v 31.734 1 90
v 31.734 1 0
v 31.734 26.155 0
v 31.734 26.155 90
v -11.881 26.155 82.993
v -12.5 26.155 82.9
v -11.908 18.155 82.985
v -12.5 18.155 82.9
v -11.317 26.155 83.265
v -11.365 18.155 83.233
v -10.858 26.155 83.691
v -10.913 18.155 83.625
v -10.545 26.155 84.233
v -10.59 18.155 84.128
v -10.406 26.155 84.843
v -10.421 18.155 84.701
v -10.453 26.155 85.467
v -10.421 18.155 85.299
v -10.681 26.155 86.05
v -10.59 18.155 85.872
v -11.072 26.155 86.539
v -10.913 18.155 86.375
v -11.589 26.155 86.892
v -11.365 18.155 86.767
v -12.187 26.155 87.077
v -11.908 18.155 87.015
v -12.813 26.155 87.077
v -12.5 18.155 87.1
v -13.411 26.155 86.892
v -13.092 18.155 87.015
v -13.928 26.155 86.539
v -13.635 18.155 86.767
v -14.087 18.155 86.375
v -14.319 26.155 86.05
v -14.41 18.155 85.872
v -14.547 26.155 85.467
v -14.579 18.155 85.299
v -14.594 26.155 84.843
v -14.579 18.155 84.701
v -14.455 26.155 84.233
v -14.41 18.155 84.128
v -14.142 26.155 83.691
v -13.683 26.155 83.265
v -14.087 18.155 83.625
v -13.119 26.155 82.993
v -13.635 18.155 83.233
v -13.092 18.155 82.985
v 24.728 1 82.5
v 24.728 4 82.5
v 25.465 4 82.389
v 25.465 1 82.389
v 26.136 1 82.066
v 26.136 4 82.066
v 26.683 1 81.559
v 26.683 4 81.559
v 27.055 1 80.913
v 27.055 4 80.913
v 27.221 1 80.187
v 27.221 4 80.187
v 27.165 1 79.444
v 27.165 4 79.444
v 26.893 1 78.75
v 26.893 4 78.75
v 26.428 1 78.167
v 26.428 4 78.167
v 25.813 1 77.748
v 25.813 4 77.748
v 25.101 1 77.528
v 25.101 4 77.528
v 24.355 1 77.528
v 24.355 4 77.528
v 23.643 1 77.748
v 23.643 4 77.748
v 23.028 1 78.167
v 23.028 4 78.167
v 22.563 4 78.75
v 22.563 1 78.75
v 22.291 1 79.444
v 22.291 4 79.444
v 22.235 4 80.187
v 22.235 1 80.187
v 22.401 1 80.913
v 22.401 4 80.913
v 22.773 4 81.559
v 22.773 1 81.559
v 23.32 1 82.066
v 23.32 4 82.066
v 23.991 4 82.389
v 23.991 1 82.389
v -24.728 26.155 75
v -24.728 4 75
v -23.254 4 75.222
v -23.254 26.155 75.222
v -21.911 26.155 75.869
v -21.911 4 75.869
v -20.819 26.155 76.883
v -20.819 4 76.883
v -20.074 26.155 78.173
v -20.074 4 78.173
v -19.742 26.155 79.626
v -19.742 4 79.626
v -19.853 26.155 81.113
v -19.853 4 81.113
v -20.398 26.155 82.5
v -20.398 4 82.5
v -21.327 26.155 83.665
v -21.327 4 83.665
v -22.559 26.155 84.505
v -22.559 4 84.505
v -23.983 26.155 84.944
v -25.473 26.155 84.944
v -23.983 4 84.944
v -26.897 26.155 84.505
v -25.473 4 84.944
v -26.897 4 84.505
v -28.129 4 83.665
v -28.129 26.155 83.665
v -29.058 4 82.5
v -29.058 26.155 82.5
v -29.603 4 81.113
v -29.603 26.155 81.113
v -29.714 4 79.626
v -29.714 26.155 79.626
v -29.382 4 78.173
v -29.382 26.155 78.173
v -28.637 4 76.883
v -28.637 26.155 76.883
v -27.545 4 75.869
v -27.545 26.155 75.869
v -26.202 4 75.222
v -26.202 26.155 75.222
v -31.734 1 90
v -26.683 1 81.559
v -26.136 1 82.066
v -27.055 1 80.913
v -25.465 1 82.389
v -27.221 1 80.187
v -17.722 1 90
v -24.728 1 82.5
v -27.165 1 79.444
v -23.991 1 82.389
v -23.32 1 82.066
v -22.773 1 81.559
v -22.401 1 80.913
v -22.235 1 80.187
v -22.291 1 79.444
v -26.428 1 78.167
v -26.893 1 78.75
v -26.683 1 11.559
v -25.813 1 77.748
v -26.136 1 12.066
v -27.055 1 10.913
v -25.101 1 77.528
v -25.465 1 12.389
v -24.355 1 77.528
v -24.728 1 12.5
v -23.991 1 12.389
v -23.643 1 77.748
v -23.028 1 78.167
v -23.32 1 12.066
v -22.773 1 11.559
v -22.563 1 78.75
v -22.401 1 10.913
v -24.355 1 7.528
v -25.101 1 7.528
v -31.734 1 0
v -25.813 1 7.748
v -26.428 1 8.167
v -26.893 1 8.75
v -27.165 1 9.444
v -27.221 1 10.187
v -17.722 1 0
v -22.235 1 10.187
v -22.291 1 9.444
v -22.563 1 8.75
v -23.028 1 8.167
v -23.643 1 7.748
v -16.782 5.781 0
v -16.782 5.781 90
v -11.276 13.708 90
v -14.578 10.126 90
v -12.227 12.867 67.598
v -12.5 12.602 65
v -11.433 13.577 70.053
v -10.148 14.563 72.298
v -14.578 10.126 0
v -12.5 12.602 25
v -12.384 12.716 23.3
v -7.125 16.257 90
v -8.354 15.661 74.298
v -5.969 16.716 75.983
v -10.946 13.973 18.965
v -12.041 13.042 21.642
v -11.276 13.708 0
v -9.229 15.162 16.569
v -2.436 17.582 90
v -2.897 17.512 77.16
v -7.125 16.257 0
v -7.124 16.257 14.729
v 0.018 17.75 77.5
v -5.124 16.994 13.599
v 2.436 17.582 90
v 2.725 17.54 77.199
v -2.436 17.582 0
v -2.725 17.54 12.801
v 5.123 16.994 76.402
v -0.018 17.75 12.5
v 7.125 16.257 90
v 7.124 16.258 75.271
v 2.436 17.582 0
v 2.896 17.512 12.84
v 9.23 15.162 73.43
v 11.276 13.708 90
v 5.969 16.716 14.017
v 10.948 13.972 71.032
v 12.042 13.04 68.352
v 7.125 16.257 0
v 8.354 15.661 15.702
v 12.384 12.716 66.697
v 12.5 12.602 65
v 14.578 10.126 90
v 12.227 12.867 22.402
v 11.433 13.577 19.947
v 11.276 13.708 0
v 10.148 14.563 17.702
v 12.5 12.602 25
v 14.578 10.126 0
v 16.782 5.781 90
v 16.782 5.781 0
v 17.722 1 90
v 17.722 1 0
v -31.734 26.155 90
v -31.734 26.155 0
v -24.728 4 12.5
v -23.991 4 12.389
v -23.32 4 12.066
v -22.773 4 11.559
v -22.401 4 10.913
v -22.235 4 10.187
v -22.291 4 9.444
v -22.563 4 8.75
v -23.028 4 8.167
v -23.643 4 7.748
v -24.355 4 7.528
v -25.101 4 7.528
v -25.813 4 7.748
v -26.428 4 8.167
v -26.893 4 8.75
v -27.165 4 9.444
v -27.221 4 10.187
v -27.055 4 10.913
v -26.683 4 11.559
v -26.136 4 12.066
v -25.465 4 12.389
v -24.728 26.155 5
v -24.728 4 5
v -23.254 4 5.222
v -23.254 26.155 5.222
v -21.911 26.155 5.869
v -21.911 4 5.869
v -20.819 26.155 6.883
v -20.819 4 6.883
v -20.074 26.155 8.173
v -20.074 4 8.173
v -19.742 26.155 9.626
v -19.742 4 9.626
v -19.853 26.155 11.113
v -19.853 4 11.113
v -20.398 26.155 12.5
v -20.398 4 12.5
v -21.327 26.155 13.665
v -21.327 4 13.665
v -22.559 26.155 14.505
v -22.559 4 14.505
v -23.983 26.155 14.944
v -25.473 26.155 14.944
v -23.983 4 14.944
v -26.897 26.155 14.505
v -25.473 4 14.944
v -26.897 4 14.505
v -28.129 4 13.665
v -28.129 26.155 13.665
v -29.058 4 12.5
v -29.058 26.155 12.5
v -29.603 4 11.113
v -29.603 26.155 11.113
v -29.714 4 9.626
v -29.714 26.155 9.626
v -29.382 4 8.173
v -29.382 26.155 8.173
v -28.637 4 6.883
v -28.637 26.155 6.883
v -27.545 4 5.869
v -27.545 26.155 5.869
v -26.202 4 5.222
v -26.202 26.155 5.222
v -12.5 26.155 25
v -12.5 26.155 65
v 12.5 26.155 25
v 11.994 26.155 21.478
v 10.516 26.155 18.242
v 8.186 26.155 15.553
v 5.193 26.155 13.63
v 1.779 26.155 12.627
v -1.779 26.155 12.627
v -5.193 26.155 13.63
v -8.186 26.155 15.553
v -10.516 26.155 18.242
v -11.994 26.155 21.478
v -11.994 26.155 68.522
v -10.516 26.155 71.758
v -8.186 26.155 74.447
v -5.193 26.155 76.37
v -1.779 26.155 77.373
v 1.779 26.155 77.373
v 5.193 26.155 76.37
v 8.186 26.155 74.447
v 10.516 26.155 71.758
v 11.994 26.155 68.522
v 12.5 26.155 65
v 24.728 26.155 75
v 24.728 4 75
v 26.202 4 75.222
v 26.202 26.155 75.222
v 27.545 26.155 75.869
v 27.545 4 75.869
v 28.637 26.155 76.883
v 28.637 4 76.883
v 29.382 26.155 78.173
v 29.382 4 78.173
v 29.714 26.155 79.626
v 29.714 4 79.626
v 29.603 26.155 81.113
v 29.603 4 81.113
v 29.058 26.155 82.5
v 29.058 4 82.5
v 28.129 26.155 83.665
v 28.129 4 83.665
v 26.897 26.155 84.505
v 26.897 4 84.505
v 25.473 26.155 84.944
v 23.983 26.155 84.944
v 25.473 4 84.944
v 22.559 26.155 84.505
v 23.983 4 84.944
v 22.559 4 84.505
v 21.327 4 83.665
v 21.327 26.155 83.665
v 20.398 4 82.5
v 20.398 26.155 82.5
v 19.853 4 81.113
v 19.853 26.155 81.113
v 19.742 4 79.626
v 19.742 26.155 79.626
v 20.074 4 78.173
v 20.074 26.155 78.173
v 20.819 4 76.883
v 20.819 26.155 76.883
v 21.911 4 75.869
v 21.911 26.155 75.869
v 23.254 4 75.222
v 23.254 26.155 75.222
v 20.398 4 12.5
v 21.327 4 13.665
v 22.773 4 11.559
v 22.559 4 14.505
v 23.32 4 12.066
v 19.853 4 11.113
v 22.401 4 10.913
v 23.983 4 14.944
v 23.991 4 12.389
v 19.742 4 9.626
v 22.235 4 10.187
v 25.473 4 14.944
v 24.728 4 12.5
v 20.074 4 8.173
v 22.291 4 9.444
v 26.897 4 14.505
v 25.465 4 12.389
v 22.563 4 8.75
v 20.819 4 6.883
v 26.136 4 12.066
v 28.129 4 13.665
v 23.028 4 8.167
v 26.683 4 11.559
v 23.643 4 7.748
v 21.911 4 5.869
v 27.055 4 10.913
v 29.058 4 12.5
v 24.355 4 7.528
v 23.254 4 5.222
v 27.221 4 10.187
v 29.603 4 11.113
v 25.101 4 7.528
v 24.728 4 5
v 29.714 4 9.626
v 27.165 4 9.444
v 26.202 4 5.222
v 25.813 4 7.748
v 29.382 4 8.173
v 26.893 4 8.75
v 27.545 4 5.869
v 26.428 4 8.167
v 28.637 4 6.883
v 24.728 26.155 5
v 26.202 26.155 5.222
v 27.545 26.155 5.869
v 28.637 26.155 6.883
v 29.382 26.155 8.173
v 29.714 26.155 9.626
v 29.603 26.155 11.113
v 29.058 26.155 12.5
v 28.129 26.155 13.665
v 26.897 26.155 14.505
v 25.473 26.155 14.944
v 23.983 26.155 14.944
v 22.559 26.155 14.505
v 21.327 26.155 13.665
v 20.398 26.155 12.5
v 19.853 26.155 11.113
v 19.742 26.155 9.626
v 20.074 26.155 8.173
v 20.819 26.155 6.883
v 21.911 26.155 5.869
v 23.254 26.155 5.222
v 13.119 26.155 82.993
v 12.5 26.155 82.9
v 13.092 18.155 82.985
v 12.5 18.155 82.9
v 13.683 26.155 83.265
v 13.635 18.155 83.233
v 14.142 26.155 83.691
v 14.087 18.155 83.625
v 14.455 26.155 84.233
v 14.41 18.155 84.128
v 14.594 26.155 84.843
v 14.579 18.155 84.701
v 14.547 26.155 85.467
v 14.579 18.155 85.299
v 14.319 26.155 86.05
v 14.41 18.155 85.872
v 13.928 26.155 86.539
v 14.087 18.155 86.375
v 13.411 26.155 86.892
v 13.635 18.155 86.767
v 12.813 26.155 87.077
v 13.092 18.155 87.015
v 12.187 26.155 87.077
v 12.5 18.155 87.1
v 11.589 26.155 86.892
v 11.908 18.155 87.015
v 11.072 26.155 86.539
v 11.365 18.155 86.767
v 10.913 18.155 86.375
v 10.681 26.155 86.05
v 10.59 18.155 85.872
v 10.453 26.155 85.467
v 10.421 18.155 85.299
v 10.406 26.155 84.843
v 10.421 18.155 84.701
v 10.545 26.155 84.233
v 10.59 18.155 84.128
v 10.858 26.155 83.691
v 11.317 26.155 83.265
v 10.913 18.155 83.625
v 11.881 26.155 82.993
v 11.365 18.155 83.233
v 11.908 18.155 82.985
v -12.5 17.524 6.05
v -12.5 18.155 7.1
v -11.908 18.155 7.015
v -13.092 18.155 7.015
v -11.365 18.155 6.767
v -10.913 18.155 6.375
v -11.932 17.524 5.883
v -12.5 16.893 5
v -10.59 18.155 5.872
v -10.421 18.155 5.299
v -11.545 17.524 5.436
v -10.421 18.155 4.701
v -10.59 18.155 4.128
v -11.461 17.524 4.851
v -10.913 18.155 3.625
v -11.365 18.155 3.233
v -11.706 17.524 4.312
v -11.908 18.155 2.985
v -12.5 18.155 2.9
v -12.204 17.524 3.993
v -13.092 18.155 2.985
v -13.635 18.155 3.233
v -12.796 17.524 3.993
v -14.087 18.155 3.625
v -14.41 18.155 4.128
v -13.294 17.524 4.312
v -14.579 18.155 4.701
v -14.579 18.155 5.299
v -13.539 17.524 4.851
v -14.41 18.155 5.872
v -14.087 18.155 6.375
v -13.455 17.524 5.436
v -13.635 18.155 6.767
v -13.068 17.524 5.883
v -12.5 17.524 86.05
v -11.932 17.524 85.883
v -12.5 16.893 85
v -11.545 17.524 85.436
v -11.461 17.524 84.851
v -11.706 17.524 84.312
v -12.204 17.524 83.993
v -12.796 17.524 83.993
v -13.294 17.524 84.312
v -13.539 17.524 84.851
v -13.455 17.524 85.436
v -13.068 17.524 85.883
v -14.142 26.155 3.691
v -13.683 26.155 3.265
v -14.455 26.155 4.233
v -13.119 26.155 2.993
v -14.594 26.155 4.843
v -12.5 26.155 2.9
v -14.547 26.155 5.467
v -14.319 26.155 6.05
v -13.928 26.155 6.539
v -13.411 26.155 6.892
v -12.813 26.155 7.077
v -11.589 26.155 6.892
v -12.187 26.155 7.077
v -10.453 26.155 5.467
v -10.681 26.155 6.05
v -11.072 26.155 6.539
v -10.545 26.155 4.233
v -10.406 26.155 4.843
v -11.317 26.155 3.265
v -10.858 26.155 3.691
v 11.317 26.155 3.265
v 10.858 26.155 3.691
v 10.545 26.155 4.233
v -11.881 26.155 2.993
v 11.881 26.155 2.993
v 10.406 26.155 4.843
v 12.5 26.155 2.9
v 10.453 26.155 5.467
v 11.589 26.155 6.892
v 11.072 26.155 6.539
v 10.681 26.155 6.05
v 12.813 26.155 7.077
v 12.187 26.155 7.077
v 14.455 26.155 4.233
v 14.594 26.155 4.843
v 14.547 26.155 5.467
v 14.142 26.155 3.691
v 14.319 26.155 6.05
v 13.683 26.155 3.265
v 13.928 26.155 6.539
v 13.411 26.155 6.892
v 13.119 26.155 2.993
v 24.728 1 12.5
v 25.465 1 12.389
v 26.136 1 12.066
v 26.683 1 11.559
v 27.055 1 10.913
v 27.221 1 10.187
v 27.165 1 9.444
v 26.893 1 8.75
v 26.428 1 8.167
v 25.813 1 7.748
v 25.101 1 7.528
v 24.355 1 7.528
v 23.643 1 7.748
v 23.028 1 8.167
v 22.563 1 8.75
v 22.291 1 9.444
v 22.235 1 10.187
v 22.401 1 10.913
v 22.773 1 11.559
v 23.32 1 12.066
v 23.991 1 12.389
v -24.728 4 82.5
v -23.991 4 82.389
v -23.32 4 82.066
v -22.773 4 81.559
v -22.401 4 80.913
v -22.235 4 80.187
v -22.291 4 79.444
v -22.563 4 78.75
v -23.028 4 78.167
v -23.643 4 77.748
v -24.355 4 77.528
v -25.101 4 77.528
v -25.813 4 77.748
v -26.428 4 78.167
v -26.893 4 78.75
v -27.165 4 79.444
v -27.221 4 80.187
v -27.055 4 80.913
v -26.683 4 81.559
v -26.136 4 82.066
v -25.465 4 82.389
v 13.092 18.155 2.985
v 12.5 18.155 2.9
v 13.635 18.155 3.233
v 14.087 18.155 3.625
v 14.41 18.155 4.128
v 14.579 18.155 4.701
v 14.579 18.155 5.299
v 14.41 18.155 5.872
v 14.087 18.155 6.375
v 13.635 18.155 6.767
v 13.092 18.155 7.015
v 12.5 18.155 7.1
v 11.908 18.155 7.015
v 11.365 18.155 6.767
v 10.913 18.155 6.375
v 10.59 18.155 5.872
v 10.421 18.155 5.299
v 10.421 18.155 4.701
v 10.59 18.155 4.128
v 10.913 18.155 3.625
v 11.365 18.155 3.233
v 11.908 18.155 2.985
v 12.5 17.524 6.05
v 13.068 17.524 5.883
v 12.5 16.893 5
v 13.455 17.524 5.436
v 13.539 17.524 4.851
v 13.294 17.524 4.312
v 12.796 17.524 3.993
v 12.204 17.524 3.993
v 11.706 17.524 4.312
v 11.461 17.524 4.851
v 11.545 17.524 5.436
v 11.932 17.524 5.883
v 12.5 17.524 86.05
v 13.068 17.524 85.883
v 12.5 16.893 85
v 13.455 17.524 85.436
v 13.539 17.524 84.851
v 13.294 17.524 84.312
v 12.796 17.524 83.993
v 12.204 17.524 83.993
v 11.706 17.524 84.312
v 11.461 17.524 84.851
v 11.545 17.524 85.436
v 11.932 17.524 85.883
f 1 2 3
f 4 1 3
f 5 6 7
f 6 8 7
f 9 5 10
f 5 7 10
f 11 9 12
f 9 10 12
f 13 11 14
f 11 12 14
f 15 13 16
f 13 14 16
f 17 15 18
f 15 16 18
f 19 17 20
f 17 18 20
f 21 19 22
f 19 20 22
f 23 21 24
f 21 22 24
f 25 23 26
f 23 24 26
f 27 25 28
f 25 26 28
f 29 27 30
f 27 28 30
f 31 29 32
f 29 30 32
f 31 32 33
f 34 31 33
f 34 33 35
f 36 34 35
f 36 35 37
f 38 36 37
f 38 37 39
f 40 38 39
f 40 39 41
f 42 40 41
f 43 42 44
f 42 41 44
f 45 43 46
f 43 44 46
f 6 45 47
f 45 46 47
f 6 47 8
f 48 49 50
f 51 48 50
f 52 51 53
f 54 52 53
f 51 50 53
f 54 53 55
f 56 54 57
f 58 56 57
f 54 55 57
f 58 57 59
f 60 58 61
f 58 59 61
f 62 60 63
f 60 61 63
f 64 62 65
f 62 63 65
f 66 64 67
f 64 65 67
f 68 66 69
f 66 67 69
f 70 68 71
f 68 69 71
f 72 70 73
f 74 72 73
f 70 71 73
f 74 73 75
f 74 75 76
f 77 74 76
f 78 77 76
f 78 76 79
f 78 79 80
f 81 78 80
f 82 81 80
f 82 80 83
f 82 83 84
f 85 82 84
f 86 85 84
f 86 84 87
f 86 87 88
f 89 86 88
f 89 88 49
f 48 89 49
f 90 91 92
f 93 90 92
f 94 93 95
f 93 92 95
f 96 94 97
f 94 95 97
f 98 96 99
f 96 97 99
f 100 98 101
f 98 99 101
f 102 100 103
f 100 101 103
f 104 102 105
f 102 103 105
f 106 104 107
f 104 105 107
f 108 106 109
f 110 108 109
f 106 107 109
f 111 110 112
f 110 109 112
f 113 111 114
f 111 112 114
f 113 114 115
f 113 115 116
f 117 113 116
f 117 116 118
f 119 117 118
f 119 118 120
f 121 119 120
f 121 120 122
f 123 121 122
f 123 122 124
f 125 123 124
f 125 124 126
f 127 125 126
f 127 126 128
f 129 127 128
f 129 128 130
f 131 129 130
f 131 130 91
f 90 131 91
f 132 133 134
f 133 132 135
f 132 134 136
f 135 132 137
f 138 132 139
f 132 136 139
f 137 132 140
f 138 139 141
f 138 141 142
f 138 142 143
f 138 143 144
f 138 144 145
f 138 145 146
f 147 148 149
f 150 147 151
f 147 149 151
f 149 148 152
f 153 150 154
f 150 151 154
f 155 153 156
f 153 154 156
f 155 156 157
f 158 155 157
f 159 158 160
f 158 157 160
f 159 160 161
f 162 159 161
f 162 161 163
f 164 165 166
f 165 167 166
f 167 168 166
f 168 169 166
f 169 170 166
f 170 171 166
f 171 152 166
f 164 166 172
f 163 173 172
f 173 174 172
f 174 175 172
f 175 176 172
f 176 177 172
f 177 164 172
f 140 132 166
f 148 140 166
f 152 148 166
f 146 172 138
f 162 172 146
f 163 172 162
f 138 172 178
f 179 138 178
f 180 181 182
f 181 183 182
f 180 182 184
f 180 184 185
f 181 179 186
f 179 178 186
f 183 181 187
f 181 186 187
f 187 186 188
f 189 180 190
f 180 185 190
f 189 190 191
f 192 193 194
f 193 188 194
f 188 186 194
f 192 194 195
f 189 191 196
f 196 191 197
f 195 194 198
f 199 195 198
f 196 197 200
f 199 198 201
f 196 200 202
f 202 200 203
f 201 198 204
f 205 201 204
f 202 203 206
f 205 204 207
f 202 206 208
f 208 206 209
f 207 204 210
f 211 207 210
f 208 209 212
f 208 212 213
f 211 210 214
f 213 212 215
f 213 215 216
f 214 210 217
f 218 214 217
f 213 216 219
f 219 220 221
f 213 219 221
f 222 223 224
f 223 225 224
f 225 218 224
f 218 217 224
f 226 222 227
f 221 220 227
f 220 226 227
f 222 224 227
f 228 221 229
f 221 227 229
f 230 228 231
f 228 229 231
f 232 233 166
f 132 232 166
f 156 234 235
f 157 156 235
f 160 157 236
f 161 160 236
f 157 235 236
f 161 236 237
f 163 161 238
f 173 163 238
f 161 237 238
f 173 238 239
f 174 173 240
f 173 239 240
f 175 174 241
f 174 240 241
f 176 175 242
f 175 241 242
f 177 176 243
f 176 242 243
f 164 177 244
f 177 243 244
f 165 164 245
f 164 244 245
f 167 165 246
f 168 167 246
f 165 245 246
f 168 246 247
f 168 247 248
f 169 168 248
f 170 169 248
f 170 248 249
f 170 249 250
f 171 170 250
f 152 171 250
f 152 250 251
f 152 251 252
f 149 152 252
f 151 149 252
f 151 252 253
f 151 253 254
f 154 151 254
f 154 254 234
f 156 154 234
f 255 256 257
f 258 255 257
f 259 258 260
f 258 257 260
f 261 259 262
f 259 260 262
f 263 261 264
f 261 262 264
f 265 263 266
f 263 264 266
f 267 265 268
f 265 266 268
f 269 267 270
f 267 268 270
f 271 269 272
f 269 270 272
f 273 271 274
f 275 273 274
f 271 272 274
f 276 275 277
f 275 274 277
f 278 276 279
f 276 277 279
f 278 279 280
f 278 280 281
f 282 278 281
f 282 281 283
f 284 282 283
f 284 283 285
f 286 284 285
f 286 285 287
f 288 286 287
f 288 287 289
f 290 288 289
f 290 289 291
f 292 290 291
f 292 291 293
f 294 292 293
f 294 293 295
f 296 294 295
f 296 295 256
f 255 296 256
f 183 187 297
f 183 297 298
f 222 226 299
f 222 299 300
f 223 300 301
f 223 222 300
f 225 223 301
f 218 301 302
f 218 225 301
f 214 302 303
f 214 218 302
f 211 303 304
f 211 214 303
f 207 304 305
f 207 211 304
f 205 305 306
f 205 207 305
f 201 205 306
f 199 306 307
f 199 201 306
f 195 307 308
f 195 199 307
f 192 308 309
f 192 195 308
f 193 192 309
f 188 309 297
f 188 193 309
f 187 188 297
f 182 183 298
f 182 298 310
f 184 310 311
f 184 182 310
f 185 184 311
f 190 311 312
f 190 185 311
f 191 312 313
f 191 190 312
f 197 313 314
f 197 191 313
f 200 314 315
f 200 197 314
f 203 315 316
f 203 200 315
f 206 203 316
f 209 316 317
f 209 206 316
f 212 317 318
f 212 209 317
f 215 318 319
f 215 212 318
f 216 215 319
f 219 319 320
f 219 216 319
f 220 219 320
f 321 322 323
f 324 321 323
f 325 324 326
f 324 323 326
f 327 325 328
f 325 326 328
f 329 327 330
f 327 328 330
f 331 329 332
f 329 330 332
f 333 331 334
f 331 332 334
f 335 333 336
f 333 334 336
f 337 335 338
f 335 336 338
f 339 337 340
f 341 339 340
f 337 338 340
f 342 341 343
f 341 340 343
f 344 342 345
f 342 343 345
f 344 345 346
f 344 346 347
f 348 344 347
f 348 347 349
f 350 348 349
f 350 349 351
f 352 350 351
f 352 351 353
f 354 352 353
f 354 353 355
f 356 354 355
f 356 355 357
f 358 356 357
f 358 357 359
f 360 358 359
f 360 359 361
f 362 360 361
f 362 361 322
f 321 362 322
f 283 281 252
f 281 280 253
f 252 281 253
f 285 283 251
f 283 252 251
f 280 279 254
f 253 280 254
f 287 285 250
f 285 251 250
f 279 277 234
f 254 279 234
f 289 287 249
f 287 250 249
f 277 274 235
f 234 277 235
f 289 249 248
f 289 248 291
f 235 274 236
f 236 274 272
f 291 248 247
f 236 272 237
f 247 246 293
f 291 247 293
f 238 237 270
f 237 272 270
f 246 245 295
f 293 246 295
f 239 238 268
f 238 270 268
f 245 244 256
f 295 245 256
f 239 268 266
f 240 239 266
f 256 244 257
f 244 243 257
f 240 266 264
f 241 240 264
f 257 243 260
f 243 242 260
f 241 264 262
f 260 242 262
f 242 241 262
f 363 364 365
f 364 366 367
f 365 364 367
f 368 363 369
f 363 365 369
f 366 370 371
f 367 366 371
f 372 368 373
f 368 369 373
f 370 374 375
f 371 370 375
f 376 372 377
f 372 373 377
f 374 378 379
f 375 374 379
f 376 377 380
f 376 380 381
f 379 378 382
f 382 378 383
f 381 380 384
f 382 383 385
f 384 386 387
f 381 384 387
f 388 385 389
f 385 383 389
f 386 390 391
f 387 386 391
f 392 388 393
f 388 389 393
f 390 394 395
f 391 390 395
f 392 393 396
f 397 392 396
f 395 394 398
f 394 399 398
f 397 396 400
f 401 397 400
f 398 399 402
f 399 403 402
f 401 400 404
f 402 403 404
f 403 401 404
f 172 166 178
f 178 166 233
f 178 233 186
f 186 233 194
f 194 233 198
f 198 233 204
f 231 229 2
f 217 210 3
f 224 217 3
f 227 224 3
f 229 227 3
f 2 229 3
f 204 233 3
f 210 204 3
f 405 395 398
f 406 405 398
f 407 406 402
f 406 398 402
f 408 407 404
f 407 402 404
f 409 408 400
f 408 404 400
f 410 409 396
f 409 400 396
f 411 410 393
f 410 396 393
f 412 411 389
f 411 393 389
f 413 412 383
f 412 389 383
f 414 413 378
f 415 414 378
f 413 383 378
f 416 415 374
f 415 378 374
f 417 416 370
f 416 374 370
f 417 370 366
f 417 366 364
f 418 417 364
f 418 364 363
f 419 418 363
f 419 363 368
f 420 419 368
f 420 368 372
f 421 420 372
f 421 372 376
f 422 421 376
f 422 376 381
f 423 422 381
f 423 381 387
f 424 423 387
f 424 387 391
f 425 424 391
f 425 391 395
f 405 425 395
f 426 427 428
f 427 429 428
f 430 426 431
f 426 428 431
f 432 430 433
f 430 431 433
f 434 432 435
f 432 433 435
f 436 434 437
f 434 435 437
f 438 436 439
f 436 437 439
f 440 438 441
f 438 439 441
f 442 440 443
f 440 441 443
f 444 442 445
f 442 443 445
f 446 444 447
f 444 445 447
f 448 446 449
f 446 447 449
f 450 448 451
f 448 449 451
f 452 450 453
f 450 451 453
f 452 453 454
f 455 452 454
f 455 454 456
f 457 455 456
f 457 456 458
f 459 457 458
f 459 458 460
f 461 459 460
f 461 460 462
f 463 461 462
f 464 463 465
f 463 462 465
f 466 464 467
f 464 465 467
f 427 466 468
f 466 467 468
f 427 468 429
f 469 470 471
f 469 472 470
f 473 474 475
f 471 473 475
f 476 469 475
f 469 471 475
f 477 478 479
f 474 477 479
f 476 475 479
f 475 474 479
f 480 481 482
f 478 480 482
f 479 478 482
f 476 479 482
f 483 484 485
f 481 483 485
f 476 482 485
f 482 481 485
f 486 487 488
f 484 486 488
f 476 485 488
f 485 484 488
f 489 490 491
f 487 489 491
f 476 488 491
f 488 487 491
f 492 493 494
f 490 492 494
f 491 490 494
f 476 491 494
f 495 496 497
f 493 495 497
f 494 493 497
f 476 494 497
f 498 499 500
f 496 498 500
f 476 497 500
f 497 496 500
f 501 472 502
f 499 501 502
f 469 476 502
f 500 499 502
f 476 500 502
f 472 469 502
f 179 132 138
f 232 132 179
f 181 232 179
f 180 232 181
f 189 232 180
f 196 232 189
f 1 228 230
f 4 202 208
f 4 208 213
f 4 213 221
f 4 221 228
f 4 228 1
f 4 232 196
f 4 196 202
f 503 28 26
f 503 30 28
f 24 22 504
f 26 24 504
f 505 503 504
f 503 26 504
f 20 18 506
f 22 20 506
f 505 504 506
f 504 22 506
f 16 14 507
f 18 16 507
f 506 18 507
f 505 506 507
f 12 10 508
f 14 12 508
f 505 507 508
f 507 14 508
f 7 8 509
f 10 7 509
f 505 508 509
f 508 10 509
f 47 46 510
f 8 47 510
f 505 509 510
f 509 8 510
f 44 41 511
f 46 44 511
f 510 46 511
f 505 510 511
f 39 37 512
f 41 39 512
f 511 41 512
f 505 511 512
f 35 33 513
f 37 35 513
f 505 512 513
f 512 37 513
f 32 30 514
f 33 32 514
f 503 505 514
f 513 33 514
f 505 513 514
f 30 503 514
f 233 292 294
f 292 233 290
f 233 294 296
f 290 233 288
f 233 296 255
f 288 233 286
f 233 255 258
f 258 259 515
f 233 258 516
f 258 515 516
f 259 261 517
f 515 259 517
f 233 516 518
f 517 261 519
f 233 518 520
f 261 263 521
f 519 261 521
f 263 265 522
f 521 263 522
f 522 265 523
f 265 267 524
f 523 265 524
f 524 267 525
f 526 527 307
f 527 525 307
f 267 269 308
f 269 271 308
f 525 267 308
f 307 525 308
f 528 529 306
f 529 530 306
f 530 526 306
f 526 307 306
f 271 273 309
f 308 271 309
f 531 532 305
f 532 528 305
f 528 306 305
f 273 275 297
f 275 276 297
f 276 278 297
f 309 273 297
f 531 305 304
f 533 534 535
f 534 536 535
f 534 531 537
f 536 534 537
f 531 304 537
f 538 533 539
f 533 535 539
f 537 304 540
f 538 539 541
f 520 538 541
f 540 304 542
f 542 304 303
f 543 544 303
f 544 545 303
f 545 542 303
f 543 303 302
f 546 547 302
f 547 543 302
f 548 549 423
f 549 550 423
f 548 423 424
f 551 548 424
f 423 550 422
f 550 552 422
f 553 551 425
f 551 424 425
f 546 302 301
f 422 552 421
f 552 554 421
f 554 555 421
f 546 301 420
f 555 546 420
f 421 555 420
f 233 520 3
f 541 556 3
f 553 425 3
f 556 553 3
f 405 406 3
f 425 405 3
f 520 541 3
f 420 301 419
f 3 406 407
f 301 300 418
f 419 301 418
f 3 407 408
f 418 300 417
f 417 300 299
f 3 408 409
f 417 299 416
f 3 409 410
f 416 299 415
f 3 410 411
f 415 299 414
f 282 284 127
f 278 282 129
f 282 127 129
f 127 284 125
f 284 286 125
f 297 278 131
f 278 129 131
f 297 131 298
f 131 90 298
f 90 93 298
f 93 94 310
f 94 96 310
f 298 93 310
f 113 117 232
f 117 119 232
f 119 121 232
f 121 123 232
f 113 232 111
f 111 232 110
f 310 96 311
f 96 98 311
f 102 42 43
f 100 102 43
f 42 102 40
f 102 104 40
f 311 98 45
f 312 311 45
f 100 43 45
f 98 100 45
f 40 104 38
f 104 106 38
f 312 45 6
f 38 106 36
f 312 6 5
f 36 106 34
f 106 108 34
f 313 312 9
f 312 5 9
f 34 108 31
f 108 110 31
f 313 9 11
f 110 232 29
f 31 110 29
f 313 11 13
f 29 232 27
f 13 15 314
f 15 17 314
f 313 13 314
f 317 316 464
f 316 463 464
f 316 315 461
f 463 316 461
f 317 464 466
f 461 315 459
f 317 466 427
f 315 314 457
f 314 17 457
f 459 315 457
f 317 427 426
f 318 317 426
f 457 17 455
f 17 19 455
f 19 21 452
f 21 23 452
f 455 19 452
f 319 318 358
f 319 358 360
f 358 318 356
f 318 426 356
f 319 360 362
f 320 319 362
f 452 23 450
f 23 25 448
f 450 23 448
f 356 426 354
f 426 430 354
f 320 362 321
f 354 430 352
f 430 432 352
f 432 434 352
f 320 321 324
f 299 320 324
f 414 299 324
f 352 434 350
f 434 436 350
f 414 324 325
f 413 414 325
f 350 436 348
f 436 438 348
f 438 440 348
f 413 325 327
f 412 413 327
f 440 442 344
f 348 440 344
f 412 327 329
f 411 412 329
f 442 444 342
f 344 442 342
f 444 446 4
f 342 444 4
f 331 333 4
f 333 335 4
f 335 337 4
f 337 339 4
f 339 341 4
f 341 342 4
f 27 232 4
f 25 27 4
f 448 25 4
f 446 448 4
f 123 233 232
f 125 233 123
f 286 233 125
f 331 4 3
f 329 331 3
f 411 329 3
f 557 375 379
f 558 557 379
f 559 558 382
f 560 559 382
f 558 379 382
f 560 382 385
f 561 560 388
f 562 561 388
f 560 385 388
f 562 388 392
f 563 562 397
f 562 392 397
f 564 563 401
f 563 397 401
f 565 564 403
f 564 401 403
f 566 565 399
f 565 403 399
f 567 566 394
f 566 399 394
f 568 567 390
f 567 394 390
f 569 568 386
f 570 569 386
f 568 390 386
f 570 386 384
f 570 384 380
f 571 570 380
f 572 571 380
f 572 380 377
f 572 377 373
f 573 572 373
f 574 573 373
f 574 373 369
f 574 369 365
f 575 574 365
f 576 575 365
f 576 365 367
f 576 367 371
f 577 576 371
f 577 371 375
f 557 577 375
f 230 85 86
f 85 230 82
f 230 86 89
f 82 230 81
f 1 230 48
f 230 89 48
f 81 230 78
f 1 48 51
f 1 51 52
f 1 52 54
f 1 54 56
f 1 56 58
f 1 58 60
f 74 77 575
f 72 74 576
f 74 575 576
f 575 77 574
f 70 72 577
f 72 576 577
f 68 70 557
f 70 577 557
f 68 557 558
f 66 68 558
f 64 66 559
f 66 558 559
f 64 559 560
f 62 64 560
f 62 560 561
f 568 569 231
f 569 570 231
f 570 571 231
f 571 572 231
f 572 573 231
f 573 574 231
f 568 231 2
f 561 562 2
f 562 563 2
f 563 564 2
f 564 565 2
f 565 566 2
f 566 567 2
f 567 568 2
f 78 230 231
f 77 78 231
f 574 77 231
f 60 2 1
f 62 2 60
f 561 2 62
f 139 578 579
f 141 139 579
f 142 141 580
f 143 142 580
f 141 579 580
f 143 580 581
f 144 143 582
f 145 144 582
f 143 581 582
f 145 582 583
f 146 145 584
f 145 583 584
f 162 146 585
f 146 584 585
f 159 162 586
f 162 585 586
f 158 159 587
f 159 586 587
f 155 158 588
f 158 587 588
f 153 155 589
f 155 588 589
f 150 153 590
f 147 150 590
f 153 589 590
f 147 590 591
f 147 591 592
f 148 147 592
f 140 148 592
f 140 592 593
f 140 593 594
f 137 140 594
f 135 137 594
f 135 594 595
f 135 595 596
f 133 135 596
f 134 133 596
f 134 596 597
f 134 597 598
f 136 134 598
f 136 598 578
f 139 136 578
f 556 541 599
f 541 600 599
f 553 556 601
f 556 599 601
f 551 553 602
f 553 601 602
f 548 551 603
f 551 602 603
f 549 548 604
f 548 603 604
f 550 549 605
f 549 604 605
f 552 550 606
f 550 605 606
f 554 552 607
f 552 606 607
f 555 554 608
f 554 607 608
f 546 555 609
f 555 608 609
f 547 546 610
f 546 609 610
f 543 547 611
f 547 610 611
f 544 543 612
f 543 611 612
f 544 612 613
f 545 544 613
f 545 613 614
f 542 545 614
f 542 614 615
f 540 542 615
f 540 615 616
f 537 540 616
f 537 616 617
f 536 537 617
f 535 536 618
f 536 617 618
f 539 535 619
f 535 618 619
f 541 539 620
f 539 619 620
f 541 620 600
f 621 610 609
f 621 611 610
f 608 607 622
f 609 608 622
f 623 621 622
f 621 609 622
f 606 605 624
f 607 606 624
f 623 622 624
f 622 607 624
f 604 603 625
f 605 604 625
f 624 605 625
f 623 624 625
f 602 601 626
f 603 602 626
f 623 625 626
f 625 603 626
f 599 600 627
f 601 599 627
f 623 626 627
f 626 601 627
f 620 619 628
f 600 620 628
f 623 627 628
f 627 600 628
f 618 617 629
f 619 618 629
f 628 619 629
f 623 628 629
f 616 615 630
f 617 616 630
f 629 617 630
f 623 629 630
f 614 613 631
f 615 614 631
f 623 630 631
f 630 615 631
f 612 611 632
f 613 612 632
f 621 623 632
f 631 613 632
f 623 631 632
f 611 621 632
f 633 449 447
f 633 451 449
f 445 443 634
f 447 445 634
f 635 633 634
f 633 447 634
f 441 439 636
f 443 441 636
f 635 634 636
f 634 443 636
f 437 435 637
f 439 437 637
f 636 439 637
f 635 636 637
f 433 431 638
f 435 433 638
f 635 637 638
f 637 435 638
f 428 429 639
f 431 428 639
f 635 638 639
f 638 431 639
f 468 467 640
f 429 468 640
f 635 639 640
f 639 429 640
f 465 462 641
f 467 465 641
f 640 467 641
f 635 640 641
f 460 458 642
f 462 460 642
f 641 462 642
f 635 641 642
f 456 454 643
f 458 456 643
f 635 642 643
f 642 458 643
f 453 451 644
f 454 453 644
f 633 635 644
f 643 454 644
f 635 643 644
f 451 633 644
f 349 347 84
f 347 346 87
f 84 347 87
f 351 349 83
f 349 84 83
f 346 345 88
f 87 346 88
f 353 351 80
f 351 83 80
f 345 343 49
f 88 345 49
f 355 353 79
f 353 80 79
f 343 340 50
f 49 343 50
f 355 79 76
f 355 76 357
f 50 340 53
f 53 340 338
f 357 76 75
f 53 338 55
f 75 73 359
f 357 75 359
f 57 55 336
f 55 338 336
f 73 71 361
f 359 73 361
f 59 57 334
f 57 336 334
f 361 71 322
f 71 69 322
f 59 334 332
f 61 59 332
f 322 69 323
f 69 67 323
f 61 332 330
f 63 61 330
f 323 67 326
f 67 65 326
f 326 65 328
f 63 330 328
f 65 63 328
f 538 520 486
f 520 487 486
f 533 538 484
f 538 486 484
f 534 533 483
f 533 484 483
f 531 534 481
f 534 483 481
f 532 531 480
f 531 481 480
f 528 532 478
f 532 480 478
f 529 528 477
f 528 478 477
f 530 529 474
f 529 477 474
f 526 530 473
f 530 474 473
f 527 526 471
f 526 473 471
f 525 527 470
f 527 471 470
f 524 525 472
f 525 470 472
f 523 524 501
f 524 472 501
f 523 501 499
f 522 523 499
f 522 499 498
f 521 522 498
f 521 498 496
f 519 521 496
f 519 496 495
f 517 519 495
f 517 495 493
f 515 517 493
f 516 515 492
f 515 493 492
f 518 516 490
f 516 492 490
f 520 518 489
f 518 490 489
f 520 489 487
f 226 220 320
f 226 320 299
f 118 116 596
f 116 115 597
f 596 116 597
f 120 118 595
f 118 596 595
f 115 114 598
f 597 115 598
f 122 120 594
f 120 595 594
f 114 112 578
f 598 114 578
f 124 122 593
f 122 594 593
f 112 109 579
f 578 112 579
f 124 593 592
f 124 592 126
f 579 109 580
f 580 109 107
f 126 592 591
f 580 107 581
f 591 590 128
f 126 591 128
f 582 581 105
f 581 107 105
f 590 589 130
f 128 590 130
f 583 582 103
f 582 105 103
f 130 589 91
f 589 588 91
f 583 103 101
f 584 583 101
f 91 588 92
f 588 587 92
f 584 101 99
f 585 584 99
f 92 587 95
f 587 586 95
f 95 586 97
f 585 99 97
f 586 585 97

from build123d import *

# Parameters (mm, degrees)
BOSS_EXTRUDE1_DEPTH             = 90
BOSS_EXTRUDE2_START             = -90
BOSS_EXTRUDE2_DEPTH             = 90
F_5_0MM_CLEARANCE_DOWEL_HOLE1_D = 5
CUT_EXTRUDE1_REACH              = 101.384
SKETCH4_R                       = 5
CUT_EXTRUDE3_DEPTH              = 101.573977748
CUT_EXTRUDE4_REACH              = 100.691
TAP_DRILL_FOR_M5X0_8_TAP1_D     = 4.2
TAP_DRILL_FOR_M5X0_8_TAP1_DEPTH = 8
TAP_DRILL_FOR_M5X0_8_TAP1_TIP   = 1.2618073


with BuildPart() as part:
    # Sketch1 → Boss-Extrude1 (new body)
    with BuildSketch(Plane.XY):
        with BuildLine():
            Line((-31.734248061, 1), (-17.721808598, 1))
            ThreePointArc((-17.721808598, 1), (0, 17.75), (17.721808598, 1))
            Line((17.721808598, 1), (31.734248061, 1))
            ThreePointArc((31.734248061, 1), (0, 31.75), (-31.734248061, 1))
        make_face()
    extrude(amount=BOSS_EXTRUDE1_DEPTH)

    # Sketch12 → Boss-Extrude2 (add)
    with BuildSketch(Plane.XY.offset(90).offset(BOSS_EXTRUDE2_START)):
        with BuildLine():
            Line((31.734248061, 31.75), (0, 31.75))
            ThreePointArc((0, 31.75), (22.094258304, 22.801452805), (31.734248061, 1))
            Line((31.734248061, 1), (31.734248061, 31.75))
        make_face()
        with BuildLine():
            Line((-31.734248061, 31.75), (-31.734248061, 1))
            ThreePointArc((-31.734248061, 1), (-22.094258304, 22.801452805), (0, 31.75))
            Line((0, 31.75), (-31.734248061, 31.75))
        make_face()
    extrude(amount=BOSS_EXTRUDE2_DEPTH)

    # Ø5.0mm Clearance Dowel Hole1 (through all)
    with Locations(Plane(origin=(-24.72802833, 1, 80), x_dir=(0, 0, -1), z_dir=(0, -1, 0))):
        with Locations((0, 0), (70, 0), (0, 49.45605666), (70, 49.45605666)):
            Hole(F_5_0MM_CLEARANCE_DOWEL_HOLE1_D / 2)

    # Sketch4 → Cut-Extrude1 (cut, up to next)
    with BuildSketch(Plane(origin=(0, 4, 0), x_dir=(-1, 0, 0), z_dir=(0, -1, 0)), mode=Mode.PRIVATE) as cut_extrude1_sk1:
        with Locations(Location((24.72802833, -80, 0), (0, 0, 90))):
            Circle(SKETCH4_R)
    cut_extrude1_tool1 = extrude(cut_extrude1_sk1.sketch, amount=-CUT_EXTRUDE1_REACH, mode=Mode.PRIVATE) & part.part
    # Sketch4 → Cut-Extrude1 (cut, up to next)
    with BuildSketch(Plane(origin=(0, 4, 0), x_dir=(-1, 0, 0), z_dir=(0, -1, 0)), mode=Mode.PRIVATE) as cut_extrude1_sk2:
        with Locations(Location((24.72802833, -10, 0), (0, 0, 90))):
            Circle(SKETCH4_R)
    cut_extrude1_tool2 = extrude(cut_extrude1_sk2.sketch, amount=-CUT_EXTRUDE1_REACH, mode=Mode.PRIVATE) & part.part
    # Sketch4 → Cut-Extrude1 (cut, up to next)
    with BuildSketch(Plane(origin=(0, 4, 0), x_dir=(-1, 0, 0), z_dir=(0, -1, 0)), mode=Mode.PRIVATE) as cut_extrude1_sk3:
        with Locations(Location((-24.72802833, -10, 0), (0, 0, 90))):
            Circle(SKETCH4_R)
    cut_extrude1_tool3 = extrude(cut_extrude1_sk3.sketch, amount=-CUT_EXTRUDE1_REACH, mode=Mode.PRIVATE) & part.part
    # Sketch4 → Cut-Extrude1 (cut, up to next)
    with BuildSketch(Plane(origin=(0, 4, 0), x_dir=(-1, 0, 0), z_dir=(0, -1, 0)), mode=Mode.PRIVATE) as cut_extrude1_sk4:
        with Locations(Location((-24.72802833, -80, 0), (0, 0, 90))):
            Circle(SKETCH4_R)
    cut_extrude1_tool4 = extrude(cut_extrude1_sk4.sketch, amount=-CUT_EXTRUDE1_REACH, mode=Mode.PRIVATE) & part.part
    add(cut_extrude1_tool1.solids().sort_by_distance((-24.728028, 4, 80))[0], mode=Mode.SUBTRACT)
    add(cut_extrude1_tool2.solids().sort_by_distance((-24.728028, 4, 10))[0], mode=Mode.SUBTRACT)
    add(cut_extrude1_tool3.solids().sort_by_distance((24.728028, 4, 10))[0], mode=Mode.SUBTRACT)
    add(cut_extrude1_tool4.solids().sort_by_distance((24.728028, 4, 80))[0], mode=Mode.SUBTRACT)

    # Sketch8 → Cut-Extrude3 (cut, through all)
    with BuildSketch(Plane.XY.offset(90)):
        with BuildLine():
            Line((-31.734248061, 26.154588508), (-18, 26.154588508))
            ThreePointArc((-18, 26.154588508), (-9.424816043, 30.318894151), (0, 31.75))
            Line((0, 31.75), (-31.734248061, 31.75))
            Line((-31.734248061, 31.75), (-31.734248061, 26.154588508))
        make_face()
        with BuildLine():
            Line((18, 26.154588508), (-18, 26.154588508))
            ThreePointArc((-18, 26.154588508), (0, 31.75), (18, 26.154588508))
        make_face()
        with BuildLine():
            ThreePointArc((0, 31.75), (9.424816043, 30.318894151), (18, 26.154588508))
            Line((18, 26.154588508), (31.734248061, 26.154588508))
            Line((31.734248061, 26.154588508), (31.734248061, 31.75))
            Line((31.734248061, 31.75), (0, 31.75))
        make_face()
    extrude(amount=-CUT_EXTRUDE3_DEPTH, mode=Mode.SUBTRACT)

    # Sketch9 → Cut-Extrude4 (cut, up to next)
    with BuildSketch(Plane.XZ.offset(-1), mode=Mode.PRIVATE) as cut_extrude4_sk1:
        with BuildLine():
            Line((-12.5, 25), (-12.5, 65))
            ThreePointArc((-12.5, 65), (0, 77.5), (12.5, 65))
            Line((12.5, 65), (12.5, 25))
            ThreePointArc((12.5, 25), (0, 12.5), (-12.5, 25))
        make_face()
    cut_extrude4_tool1 = extrude(cut_extrude4_sk1.sketch, amount=-CUT_EXTRUDE4_REACH, mode=Mode.PRIVATE) & part.part
    add(cut_extrude4_tool1.solids().sort_by_distance((0, 1, 45))[0], mode=Mode.SUBTRACT)

    # Tap Drill for M5x0.8 Tap1
    with Locations(Plane(origin=(-12.5, 26.154588508, 5), x_dir=(0, 0, 1), z_dir=(0, 1, 0))):
        with Locations((0, 0), (0, 25), (80, 25), (80, 0)):
            Hole(TAP_DRILL_FOR_M5X0_8_TAP1_D / 2, depth=TAP_DRILL_FOR_M5X0_8_TAP1_DEPTH)
            with Locations((0, 0, -(TAP_DRILL_FOR_M5X0_8_TAP1_DEPTH + TAP_DRILL_FOR_M5X0_8_TAP1_TIP / 2))):  # 118° drill point
                Cone(0, TAP_DRILL_FOR_M5X0_8_TAP1_D / 2, TAP_DRILL_FOR_M5X0_8_TAP1_TIP, mode=Mode.SUBTRACT)


solid = part.part
